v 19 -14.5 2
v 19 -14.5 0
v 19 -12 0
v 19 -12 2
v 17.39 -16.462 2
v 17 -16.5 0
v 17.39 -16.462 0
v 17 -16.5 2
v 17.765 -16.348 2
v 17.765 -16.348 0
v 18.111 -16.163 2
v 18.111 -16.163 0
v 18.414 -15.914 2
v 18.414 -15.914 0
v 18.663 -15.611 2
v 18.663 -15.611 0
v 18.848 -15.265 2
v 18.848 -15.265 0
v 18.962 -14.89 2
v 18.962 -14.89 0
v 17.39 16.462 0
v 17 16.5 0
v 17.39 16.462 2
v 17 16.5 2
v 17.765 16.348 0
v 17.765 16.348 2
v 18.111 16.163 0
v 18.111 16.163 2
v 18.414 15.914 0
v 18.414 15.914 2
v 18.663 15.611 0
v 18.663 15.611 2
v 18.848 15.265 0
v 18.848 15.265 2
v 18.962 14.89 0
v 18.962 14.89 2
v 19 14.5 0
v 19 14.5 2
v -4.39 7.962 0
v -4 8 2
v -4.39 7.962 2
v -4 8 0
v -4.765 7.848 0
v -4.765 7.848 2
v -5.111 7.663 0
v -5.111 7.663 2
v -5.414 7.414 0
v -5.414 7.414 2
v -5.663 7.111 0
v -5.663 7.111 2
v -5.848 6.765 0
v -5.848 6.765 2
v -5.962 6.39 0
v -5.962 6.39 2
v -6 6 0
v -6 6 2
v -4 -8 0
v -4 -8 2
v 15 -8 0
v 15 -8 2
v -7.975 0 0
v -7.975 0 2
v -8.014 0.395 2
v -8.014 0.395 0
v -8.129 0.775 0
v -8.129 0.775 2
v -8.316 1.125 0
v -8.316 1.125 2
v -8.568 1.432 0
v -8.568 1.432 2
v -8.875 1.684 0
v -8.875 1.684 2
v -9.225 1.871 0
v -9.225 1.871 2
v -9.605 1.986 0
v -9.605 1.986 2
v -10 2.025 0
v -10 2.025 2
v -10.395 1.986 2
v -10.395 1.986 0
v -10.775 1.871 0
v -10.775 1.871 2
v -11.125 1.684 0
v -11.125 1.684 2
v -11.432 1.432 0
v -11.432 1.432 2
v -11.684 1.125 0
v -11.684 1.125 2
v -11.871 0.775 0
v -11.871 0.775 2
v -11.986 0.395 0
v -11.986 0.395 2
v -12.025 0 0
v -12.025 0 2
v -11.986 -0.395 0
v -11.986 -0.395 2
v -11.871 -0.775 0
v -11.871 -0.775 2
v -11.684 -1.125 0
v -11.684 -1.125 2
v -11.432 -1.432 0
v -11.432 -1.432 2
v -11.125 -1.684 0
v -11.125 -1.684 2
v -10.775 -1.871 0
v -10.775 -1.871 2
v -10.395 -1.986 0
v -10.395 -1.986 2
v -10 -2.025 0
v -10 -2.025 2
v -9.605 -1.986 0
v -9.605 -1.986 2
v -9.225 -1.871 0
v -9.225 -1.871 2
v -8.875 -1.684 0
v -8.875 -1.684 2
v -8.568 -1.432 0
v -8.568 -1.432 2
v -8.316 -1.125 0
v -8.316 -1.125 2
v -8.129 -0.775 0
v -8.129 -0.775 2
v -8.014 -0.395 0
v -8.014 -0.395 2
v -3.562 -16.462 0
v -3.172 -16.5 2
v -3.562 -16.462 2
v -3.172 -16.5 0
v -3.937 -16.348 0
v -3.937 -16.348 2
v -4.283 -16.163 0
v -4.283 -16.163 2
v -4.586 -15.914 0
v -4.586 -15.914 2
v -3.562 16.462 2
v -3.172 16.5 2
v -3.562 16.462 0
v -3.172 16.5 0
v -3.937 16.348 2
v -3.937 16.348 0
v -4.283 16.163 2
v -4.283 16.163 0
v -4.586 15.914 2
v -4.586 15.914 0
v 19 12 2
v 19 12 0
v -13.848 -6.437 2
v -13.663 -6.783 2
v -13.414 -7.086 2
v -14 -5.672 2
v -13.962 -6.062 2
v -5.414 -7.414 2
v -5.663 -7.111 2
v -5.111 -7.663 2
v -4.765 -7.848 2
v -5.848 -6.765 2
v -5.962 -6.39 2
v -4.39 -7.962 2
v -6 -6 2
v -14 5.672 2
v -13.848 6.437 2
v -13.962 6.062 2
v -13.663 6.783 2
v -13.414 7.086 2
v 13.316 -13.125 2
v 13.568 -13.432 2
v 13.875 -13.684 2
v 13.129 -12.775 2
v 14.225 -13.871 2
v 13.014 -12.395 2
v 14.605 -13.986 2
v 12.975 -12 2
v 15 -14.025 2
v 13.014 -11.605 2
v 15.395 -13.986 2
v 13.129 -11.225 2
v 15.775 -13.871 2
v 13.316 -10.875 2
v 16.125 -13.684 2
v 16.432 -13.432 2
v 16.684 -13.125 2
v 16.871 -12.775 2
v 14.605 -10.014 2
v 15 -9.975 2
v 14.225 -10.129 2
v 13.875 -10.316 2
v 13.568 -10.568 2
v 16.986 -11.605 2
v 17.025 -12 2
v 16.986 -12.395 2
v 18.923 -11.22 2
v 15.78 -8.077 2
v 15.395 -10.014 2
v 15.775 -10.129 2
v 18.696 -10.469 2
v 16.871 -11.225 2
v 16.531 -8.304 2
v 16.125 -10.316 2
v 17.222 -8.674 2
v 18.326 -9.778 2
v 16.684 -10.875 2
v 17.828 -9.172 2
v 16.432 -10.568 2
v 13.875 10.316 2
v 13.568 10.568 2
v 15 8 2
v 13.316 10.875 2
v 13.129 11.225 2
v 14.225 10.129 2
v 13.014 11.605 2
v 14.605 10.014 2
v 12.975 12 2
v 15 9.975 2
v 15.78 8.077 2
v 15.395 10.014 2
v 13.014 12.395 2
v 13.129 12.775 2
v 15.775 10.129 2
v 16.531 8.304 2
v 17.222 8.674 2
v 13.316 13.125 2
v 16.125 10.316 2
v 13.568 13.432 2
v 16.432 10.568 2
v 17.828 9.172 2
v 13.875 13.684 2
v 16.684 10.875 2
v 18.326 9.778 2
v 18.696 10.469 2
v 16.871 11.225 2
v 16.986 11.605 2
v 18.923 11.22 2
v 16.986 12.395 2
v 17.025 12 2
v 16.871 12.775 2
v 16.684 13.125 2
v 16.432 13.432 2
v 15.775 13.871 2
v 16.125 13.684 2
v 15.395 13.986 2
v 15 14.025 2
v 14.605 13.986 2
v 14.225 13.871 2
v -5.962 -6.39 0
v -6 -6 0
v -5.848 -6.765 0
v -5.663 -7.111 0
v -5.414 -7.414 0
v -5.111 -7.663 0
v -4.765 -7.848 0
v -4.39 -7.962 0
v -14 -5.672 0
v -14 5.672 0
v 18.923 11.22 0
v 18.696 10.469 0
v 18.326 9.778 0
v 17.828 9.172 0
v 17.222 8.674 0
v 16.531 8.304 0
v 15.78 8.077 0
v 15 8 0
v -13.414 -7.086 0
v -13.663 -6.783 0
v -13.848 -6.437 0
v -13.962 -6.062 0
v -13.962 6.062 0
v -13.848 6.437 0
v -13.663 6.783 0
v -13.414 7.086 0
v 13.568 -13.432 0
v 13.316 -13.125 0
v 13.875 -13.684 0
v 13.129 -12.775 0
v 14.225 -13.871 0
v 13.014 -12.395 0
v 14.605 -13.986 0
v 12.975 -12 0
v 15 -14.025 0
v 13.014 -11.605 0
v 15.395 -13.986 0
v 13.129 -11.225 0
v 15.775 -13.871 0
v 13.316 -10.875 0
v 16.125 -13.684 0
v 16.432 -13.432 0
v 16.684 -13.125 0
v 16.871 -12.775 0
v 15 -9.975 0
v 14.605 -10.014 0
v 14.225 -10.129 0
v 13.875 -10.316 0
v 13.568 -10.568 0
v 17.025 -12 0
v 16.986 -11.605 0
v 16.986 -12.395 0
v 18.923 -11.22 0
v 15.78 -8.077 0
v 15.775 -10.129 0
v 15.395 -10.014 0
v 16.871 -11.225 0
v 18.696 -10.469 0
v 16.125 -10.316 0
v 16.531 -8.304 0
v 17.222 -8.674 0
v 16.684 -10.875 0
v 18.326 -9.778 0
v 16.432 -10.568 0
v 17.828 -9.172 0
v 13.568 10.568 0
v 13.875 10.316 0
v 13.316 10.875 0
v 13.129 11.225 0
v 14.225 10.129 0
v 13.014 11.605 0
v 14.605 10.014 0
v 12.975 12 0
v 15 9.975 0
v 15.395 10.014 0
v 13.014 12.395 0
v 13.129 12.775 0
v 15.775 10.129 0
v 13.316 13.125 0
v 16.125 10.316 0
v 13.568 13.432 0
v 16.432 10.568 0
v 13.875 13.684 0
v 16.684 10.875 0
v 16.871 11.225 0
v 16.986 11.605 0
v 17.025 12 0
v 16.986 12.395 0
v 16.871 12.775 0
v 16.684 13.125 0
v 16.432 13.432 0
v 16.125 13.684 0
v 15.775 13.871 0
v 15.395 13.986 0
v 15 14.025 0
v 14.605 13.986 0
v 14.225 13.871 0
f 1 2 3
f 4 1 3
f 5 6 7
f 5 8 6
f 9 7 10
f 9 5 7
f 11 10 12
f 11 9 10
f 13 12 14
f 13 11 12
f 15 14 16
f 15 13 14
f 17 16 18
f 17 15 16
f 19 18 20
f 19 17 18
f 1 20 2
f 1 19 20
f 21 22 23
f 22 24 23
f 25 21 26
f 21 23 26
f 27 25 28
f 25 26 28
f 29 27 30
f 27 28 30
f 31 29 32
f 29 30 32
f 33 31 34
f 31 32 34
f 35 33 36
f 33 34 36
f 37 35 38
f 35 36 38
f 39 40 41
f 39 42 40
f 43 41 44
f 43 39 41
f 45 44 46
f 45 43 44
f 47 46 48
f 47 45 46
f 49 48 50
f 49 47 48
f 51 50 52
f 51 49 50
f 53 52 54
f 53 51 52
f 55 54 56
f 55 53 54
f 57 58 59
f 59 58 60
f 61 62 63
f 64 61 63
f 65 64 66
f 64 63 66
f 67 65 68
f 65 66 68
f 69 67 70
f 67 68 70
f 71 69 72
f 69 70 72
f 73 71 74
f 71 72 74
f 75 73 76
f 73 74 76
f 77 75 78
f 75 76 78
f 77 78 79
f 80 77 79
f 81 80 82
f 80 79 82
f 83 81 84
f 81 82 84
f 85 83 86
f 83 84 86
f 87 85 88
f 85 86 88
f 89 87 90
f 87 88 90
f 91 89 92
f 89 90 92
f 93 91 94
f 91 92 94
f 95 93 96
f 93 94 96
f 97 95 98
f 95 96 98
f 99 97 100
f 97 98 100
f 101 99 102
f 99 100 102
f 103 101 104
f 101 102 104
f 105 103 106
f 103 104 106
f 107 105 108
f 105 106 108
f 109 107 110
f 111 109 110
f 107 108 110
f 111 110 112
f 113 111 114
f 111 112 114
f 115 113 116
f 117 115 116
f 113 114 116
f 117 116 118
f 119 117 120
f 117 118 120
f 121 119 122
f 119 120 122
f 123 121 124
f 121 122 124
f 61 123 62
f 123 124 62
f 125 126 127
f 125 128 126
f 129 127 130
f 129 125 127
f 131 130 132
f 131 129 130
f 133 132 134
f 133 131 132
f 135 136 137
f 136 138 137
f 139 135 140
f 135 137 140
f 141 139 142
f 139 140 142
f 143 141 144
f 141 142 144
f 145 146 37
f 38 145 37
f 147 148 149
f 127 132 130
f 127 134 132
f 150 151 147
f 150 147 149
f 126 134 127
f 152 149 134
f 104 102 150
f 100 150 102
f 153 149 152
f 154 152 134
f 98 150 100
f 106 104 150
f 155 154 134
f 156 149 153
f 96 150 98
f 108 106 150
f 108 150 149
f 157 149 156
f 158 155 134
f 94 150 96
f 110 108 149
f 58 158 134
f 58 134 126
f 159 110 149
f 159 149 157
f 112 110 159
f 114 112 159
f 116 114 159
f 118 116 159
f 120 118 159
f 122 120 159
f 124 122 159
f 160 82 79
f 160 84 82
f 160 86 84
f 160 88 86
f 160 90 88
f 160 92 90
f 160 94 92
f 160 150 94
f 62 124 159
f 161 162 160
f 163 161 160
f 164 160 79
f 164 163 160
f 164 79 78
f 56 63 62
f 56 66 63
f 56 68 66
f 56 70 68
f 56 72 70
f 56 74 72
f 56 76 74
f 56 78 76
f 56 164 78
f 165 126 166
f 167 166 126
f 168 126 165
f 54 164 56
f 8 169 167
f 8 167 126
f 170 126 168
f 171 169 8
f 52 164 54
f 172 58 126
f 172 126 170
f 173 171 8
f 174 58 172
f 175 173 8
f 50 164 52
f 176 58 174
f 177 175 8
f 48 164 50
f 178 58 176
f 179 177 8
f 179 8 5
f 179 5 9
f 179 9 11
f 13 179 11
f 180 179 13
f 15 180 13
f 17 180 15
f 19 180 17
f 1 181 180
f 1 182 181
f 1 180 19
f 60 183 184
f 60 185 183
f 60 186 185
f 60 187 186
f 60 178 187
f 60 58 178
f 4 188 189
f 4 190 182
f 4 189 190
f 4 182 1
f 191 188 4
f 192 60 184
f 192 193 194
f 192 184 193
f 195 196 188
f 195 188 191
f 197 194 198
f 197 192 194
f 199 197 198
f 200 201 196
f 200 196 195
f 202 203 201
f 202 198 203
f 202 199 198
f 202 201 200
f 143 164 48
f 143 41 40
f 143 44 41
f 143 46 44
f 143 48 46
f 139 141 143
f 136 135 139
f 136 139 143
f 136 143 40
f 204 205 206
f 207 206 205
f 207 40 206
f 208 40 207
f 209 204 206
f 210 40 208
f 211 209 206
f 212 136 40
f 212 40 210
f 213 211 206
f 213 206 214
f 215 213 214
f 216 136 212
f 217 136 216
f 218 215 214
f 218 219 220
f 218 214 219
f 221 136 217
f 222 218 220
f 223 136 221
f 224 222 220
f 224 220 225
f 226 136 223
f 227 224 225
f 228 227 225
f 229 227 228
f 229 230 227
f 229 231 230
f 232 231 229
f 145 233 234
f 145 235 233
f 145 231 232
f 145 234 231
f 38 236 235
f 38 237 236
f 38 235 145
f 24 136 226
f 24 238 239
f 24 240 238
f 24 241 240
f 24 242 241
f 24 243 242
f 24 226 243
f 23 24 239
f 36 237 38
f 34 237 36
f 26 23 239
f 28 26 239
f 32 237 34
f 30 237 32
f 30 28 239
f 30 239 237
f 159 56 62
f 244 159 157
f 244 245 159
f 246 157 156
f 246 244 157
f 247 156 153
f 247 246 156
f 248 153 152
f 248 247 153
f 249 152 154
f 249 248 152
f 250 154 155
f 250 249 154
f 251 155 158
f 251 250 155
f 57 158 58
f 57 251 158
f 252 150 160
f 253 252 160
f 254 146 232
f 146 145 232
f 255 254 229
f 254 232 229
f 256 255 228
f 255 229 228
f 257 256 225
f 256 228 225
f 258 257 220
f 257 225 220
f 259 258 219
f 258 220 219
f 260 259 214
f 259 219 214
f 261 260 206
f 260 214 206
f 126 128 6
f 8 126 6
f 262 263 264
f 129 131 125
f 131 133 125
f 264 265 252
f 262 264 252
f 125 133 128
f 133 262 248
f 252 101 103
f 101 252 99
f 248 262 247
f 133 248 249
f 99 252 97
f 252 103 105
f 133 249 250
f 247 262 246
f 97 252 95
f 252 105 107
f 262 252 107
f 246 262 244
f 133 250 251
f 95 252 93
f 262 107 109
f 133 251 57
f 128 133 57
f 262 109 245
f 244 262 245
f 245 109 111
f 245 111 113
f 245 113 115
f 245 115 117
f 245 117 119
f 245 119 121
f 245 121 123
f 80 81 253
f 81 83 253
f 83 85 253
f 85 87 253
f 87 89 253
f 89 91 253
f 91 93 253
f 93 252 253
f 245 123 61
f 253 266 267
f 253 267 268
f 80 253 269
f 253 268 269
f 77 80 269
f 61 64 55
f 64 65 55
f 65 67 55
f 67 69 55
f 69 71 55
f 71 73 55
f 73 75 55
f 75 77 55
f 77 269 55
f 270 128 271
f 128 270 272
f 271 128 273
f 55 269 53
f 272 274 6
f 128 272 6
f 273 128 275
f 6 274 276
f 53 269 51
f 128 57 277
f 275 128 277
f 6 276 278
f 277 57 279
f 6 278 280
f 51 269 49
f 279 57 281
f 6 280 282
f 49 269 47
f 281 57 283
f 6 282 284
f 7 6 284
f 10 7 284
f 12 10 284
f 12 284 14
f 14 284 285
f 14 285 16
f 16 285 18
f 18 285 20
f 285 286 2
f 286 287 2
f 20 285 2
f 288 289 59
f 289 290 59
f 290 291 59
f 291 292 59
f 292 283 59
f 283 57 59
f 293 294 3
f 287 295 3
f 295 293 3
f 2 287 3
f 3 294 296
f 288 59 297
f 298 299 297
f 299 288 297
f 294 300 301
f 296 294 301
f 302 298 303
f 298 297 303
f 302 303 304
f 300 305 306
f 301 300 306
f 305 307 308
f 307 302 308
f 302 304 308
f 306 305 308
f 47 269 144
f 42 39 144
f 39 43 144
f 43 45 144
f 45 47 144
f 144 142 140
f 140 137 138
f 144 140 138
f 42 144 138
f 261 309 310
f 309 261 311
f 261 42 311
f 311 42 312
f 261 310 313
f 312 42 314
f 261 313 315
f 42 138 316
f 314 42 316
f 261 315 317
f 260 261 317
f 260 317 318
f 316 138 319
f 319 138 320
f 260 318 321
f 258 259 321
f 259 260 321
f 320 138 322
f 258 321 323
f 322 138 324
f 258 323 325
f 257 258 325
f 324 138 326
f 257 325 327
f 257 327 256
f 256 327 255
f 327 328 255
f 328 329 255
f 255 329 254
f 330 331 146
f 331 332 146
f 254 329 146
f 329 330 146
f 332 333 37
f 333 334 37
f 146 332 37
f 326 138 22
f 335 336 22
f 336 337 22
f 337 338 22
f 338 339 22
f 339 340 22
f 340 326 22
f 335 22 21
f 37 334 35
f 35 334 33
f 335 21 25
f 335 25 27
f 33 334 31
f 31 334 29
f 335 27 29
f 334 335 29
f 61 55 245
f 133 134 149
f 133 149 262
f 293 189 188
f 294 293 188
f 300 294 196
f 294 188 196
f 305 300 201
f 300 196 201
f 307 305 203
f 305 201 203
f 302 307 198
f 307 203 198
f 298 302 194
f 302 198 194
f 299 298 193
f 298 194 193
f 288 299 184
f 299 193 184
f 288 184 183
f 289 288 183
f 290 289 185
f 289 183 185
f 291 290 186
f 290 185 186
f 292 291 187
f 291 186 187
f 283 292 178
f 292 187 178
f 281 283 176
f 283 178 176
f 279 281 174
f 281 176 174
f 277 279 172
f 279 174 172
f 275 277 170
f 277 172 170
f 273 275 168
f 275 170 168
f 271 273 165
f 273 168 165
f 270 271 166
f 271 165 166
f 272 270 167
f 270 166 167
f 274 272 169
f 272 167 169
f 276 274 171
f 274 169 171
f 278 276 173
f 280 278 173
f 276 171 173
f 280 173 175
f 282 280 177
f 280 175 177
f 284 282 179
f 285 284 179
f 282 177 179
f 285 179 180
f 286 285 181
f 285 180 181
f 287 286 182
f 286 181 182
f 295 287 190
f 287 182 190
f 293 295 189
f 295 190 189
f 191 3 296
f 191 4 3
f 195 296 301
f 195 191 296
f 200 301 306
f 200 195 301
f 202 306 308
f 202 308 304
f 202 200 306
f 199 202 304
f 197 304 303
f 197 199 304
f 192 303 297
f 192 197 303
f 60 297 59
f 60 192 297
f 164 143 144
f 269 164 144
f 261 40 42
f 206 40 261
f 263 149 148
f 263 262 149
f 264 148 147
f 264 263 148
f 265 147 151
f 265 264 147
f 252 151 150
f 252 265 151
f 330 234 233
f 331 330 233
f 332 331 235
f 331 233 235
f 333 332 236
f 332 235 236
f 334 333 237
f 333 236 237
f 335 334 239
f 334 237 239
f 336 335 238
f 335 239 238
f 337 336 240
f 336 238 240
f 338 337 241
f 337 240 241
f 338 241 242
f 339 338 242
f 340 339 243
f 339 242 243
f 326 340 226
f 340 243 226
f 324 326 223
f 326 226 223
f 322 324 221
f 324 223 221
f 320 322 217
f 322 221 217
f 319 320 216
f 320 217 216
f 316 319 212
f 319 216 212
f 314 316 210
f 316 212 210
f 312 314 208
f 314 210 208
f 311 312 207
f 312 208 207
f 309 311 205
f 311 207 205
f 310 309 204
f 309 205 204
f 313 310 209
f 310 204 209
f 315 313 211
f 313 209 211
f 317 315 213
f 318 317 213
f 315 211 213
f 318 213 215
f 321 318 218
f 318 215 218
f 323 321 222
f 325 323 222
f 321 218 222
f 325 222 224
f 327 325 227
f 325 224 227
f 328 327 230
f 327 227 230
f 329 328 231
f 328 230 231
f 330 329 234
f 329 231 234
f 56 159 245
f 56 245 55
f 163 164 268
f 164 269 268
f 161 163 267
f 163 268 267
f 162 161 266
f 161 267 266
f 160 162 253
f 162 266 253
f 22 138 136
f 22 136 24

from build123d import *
from OCP.BRepFilletAPI import BRepFilletAPI_MakeFillet

# Parameters (mm, degrees)
SKETCH_1_W          = 38
SKETCH_1_H          = 33
EXTRUDE_1_DEPTH     = 2
SKETCH_2_R          = 2.025
CUT_EXTRUDE_1_DEPTH = 2
SKETCH_3_W          = 50
SKETCH_3_H          = 16
CUT_EXTRUDE_2_DEPTH = 2
FILLET_1_R1         = 2
FILLET_1_R2         = 4
SKETCH_4_W          = 5
SKETCH_4_H          = 33
CUT_EXTRUDE_3_DEPTH = 2
CHAMFER_1_SIZE      = 10
FILLET_2_R          = 2


with BuildPart() as part:
    # Sketch 1 → Extrude 1 (new body)
    with BuildSketch(Plane.XY):
        Rectangle(SKETCH_1_W, SKETCH_1_H)
    extrude(amount=EXTRUDE_1_DEPTH)

    # Sketch 2 → Cut-Extrude 1 (cut)
    with BuildSketch(Plane.XY.offset(2)):
        with Locations((-10, 0)):
            Circle(SKETCH_2_R)
        with Locations((15, -12)):
            Circle(SKETCH_2_R)
        with Locations((15, 12)):
            Circle(SKETCH_2_R)
    extrude(amount=-CUT_EXTRUDE_1_DEPTH, mode=Mode.SUBTRACT)

    # Sketch 3 → Cut-Extrude 2 (cut)
    with BuildSketch(Plane.XY.offset(2)):
        with Locations((19, 0)):
            Rectangle(SKETCH_3_W, SKETCH_3_H)
    extrude(amount=-CUT_EXTRUDE_2_DEPTH, mode=Mode.SUBTRACT)

    # Fillet 1: one fillet with a radius per group of edges: ONE call of the kernel's fillet builder (fillet() takes one radius for all edges)
    fillet_1_edges_1 = [part.edges().sort_by_distance(p)[0] for p in [
        (-6, -8, 1),
        (-6, 8, 1),
        (19, -16.5, 1),
        (19, 16.5, 1),
    ]]
    fillet_1_edges_2 = [part.edges().sort_by_distance(p)[0] for p in [
        (19, 8, 1),
        (19, -8, 1),
    ]]
    fillet_1 = BRepFilletAPI_MakeFillet(part.part.solid().wrapped)
    for e in fillet_1_edges_1:
        fillet_1.Add(FILLET_1_R1, e.wrapped)
    for e in fillet_1_edges_2:
        fillet_1.Add(FILLET_1_R2, e.wrapped)
    add(Compound.cast(fillet_1.Shape()), mode=Mode.REPLACE)

    # Sketch 4 → Cut-Extrude 3 (cut)
    with BuildSketch(Plane.XY.offset(2)):
        with Locations((-16.5, 0)):
            Rectangle(SKETCH_4_W, SKETCH_4_H)
    extrude(amount=-CUT_EXTRUDE_3_DEPTH, mode=Mode.SUBTRACT)

    # Chamfer 1
    chamfer_1_edges = [part.edges().sort_by_distance(p)[0] for p in [
        (-14, 16.5, 1),
        (-14, -16.5, 1),
    ]]
    chamfer(chamfer_1_edges, length=CHAMFER_1_SIZE)

    # Fillet 2
    fillet_2_edges = [part.edges().sort_by_distance(p)[0] for p in [
        (-4, 16.5, 1),
        (-14, -6.5, 1),
        (-14, 6.5, 1),
        (-4, -16.5, 1),
    ]]
    fillet(fillet_2_edges, radius=FILLET_2_R)


solid = part.part
